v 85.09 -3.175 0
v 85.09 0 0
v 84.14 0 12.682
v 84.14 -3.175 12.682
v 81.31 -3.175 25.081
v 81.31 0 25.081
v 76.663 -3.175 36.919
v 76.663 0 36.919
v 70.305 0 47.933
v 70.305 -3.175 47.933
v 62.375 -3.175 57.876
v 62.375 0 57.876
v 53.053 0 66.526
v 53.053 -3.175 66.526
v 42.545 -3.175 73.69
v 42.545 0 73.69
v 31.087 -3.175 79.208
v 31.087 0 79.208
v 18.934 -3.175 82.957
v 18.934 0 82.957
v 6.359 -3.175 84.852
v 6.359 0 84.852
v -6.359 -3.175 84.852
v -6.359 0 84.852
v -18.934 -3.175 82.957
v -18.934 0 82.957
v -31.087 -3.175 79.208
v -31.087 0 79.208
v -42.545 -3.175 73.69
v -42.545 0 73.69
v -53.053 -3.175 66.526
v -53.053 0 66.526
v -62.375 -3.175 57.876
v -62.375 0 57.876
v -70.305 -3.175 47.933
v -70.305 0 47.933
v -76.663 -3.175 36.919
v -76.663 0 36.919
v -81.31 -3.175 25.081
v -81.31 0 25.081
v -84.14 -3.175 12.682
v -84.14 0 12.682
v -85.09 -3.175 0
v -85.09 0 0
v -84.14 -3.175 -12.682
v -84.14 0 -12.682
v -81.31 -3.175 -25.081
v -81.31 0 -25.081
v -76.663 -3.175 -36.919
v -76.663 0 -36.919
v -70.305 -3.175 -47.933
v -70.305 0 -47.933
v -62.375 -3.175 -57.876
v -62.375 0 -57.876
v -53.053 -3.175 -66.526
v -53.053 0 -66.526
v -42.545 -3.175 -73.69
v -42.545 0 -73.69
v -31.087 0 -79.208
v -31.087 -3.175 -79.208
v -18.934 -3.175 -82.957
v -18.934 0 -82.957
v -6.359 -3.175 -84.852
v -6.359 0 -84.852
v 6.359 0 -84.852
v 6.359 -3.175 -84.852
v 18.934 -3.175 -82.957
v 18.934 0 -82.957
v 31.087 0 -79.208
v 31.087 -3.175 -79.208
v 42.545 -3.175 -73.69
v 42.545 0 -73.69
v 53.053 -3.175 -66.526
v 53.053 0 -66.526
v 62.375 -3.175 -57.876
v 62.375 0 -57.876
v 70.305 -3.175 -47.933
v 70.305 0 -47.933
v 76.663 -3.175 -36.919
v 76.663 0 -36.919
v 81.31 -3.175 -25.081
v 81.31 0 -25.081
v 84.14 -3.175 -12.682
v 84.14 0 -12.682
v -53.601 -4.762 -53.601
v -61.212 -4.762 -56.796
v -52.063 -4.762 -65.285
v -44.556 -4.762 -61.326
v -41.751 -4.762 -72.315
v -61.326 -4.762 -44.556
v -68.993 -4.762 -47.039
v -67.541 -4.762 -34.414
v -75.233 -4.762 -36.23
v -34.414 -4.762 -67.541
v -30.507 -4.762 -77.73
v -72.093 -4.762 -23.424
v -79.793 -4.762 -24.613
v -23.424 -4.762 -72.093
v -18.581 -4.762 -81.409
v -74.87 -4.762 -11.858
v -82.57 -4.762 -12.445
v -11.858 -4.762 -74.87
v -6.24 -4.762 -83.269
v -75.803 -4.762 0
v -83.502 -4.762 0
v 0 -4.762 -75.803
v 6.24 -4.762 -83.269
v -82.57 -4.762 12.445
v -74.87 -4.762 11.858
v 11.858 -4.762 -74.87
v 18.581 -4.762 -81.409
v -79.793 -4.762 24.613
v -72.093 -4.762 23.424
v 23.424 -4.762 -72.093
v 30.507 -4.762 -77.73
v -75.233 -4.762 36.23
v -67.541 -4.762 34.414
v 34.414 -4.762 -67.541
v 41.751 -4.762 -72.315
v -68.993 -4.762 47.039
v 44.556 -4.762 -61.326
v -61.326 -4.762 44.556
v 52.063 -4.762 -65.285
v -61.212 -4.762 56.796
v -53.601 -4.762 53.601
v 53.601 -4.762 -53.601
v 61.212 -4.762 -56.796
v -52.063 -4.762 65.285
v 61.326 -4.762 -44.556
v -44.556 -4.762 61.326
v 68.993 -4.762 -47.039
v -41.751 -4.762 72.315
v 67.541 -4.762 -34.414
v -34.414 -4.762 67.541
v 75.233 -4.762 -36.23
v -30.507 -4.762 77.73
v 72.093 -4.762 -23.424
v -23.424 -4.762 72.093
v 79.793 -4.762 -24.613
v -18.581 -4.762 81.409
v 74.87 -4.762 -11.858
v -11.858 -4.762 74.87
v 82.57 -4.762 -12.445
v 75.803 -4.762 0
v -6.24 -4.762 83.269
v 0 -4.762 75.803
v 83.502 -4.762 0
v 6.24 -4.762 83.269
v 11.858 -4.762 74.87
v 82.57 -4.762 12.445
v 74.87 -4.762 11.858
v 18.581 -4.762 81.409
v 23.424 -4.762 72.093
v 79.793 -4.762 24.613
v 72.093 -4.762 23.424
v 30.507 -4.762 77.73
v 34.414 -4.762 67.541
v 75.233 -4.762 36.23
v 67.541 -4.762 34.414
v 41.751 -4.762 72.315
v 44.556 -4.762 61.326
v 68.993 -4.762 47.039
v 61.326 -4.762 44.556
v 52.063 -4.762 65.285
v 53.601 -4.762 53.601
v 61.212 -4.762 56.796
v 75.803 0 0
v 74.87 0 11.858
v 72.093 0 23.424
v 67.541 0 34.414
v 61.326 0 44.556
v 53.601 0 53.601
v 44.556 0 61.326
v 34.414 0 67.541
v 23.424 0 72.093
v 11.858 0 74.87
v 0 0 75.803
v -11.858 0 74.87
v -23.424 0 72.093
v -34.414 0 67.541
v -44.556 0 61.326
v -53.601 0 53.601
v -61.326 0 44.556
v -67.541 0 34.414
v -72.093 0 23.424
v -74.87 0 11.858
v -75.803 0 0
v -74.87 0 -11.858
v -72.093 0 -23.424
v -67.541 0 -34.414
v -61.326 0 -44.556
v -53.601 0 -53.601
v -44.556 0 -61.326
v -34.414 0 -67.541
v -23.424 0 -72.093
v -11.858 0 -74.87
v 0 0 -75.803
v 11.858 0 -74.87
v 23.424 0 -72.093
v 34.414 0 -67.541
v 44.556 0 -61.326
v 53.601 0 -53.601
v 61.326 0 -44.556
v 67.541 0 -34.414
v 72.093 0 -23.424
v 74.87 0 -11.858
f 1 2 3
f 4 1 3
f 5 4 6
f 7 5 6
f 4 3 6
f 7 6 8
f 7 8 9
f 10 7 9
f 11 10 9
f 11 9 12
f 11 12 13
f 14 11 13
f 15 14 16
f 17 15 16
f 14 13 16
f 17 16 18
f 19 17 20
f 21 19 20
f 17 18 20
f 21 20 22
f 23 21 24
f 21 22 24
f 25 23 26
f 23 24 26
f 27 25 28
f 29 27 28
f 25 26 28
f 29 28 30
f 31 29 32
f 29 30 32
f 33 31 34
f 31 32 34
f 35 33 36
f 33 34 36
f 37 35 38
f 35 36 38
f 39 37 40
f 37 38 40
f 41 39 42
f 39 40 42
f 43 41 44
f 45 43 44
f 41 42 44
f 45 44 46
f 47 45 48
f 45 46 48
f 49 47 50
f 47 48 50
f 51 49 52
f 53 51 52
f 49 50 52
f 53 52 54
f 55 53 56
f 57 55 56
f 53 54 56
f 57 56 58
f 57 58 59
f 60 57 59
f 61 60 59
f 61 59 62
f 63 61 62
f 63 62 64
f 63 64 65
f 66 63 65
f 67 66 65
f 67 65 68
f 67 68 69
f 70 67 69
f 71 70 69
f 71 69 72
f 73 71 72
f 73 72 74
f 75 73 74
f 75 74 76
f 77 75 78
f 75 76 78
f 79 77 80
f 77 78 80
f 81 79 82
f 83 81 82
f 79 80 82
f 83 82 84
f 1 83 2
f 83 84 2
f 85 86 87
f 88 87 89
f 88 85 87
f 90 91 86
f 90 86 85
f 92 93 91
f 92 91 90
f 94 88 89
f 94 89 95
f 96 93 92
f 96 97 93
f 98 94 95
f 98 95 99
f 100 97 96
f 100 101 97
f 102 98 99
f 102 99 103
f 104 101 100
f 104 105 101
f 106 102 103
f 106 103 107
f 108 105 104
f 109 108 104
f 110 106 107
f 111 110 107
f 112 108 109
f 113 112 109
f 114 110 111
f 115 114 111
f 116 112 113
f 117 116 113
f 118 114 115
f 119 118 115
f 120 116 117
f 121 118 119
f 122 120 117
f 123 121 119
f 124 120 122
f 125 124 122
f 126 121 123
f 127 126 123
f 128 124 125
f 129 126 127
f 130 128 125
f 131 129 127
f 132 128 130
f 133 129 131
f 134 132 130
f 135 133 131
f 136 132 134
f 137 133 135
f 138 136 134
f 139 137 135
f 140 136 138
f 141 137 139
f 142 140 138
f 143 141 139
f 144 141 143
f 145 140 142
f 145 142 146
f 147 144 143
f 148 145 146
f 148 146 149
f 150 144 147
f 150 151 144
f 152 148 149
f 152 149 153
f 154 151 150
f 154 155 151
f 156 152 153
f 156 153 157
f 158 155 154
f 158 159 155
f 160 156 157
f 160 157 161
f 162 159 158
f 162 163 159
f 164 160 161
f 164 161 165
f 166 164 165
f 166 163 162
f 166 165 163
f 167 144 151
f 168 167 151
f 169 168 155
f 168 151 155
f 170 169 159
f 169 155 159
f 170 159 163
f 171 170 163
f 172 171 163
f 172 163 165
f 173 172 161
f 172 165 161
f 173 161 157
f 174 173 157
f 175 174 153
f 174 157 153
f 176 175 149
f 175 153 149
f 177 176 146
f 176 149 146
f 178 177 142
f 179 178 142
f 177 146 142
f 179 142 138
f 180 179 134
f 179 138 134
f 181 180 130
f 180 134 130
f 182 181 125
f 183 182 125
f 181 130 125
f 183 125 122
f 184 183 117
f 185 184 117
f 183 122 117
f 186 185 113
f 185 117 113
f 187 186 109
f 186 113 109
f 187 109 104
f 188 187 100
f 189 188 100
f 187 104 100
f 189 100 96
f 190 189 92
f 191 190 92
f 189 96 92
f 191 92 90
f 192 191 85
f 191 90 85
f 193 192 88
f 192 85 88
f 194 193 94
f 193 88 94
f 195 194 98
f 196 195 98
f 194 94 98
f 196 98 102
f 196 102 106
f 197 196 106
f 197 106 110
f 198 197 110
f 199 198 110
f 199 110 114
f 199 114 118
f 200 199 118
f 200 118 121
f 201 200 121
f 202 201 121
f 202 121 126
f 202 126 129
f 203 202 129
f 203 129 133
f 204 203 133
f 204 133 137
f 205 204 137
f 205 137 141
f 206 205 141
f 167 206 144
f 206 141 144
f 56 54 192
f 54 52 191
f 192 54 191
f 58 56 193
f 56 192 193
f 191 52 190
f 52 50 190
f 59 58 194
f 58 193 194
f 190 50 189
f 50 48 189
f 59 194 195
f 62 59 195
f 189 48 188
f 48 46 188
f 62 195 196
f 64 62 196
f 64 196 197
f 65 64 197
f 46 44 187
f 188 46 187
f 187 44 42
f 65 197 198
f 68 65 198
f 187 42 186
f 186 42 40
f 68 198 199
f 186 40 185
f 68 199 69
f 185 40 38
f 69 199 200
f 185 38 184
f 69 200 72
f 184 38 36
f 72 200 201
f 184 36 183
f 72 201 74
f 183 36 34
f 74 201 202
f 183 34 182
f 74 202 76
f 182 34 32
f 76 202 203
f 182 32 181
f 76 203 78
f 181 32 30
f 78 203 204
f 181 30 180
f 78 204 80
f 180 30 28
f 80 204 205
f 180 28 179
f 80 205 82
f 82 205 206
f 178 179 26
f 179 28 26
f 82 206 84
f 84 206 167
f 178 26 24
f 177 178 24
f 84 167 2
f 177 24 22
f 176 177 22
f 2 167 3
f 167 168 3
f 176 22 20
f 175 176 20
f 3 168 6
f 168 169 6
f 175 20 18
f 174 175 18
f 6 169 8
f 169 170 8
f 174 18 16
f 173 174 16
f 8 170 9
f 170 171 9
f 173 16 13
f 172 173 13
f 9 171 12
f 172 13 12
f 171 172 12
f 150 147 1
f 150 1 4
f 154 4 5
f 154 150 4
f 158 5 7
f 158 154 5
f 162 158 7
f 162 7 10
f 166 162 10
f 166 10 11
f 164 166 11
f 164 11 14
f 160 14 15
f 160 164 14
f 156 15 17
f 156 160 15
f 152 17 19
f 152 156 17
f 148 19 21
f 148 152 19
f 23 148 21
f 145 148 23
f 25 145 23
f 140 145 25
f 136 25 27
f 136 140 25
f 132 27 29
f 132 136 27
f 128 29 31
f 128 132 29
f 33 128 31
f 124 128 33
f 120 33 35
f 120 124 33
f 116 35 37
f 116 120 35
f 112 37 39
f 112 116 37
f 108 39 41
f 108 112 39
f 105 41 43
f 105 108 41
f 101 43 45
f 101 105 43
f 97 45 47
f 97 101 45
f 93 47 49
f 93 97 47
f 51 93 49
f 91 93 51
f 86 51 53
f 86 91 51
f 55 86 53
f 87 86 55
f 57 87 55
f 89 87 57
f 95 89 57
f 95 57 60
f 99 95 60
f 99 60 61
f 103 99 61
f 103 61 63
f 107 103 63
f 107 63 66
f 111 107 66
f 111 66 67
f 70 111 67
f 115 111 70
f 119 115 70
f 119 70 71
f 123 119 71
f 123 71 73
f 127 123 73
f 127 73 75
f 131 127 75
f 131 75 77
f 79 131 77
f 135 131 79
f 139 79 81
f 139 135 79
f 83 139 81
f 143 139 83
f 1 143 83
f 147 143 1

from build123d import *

# Parameters (mm, degrees)
F0_R     = 85.09
F1_DEPTH = 4.7625
F2_R     = 75.803125
F3_DEPTH = 4.7625
F4_SIZE  = 1.5875


with BuildPart() as f1:
    # F0 (on Front) → F1 (new body)
    with BuildSketch(Plane.XZ):
        Circle(F0_R)
    extrude(amount=F1_DEPTH)

    # F2 (on face) → F3 (cut)
    with BuildSketch(Plane.XZ.offset(4.7625)):
        Circle(F2_R)
    extrude(amount=-F3_DEPTH, mode=Mode.SUBTRACT)

    # F4
    f4_edges = [f1.edges().sort_by_distance(p)[0] for p in [
        (-85.09, -4.7625, 0),
    ]]
    chamfer(f4_edges, length=F4_SIZE)


solid = f1.part
